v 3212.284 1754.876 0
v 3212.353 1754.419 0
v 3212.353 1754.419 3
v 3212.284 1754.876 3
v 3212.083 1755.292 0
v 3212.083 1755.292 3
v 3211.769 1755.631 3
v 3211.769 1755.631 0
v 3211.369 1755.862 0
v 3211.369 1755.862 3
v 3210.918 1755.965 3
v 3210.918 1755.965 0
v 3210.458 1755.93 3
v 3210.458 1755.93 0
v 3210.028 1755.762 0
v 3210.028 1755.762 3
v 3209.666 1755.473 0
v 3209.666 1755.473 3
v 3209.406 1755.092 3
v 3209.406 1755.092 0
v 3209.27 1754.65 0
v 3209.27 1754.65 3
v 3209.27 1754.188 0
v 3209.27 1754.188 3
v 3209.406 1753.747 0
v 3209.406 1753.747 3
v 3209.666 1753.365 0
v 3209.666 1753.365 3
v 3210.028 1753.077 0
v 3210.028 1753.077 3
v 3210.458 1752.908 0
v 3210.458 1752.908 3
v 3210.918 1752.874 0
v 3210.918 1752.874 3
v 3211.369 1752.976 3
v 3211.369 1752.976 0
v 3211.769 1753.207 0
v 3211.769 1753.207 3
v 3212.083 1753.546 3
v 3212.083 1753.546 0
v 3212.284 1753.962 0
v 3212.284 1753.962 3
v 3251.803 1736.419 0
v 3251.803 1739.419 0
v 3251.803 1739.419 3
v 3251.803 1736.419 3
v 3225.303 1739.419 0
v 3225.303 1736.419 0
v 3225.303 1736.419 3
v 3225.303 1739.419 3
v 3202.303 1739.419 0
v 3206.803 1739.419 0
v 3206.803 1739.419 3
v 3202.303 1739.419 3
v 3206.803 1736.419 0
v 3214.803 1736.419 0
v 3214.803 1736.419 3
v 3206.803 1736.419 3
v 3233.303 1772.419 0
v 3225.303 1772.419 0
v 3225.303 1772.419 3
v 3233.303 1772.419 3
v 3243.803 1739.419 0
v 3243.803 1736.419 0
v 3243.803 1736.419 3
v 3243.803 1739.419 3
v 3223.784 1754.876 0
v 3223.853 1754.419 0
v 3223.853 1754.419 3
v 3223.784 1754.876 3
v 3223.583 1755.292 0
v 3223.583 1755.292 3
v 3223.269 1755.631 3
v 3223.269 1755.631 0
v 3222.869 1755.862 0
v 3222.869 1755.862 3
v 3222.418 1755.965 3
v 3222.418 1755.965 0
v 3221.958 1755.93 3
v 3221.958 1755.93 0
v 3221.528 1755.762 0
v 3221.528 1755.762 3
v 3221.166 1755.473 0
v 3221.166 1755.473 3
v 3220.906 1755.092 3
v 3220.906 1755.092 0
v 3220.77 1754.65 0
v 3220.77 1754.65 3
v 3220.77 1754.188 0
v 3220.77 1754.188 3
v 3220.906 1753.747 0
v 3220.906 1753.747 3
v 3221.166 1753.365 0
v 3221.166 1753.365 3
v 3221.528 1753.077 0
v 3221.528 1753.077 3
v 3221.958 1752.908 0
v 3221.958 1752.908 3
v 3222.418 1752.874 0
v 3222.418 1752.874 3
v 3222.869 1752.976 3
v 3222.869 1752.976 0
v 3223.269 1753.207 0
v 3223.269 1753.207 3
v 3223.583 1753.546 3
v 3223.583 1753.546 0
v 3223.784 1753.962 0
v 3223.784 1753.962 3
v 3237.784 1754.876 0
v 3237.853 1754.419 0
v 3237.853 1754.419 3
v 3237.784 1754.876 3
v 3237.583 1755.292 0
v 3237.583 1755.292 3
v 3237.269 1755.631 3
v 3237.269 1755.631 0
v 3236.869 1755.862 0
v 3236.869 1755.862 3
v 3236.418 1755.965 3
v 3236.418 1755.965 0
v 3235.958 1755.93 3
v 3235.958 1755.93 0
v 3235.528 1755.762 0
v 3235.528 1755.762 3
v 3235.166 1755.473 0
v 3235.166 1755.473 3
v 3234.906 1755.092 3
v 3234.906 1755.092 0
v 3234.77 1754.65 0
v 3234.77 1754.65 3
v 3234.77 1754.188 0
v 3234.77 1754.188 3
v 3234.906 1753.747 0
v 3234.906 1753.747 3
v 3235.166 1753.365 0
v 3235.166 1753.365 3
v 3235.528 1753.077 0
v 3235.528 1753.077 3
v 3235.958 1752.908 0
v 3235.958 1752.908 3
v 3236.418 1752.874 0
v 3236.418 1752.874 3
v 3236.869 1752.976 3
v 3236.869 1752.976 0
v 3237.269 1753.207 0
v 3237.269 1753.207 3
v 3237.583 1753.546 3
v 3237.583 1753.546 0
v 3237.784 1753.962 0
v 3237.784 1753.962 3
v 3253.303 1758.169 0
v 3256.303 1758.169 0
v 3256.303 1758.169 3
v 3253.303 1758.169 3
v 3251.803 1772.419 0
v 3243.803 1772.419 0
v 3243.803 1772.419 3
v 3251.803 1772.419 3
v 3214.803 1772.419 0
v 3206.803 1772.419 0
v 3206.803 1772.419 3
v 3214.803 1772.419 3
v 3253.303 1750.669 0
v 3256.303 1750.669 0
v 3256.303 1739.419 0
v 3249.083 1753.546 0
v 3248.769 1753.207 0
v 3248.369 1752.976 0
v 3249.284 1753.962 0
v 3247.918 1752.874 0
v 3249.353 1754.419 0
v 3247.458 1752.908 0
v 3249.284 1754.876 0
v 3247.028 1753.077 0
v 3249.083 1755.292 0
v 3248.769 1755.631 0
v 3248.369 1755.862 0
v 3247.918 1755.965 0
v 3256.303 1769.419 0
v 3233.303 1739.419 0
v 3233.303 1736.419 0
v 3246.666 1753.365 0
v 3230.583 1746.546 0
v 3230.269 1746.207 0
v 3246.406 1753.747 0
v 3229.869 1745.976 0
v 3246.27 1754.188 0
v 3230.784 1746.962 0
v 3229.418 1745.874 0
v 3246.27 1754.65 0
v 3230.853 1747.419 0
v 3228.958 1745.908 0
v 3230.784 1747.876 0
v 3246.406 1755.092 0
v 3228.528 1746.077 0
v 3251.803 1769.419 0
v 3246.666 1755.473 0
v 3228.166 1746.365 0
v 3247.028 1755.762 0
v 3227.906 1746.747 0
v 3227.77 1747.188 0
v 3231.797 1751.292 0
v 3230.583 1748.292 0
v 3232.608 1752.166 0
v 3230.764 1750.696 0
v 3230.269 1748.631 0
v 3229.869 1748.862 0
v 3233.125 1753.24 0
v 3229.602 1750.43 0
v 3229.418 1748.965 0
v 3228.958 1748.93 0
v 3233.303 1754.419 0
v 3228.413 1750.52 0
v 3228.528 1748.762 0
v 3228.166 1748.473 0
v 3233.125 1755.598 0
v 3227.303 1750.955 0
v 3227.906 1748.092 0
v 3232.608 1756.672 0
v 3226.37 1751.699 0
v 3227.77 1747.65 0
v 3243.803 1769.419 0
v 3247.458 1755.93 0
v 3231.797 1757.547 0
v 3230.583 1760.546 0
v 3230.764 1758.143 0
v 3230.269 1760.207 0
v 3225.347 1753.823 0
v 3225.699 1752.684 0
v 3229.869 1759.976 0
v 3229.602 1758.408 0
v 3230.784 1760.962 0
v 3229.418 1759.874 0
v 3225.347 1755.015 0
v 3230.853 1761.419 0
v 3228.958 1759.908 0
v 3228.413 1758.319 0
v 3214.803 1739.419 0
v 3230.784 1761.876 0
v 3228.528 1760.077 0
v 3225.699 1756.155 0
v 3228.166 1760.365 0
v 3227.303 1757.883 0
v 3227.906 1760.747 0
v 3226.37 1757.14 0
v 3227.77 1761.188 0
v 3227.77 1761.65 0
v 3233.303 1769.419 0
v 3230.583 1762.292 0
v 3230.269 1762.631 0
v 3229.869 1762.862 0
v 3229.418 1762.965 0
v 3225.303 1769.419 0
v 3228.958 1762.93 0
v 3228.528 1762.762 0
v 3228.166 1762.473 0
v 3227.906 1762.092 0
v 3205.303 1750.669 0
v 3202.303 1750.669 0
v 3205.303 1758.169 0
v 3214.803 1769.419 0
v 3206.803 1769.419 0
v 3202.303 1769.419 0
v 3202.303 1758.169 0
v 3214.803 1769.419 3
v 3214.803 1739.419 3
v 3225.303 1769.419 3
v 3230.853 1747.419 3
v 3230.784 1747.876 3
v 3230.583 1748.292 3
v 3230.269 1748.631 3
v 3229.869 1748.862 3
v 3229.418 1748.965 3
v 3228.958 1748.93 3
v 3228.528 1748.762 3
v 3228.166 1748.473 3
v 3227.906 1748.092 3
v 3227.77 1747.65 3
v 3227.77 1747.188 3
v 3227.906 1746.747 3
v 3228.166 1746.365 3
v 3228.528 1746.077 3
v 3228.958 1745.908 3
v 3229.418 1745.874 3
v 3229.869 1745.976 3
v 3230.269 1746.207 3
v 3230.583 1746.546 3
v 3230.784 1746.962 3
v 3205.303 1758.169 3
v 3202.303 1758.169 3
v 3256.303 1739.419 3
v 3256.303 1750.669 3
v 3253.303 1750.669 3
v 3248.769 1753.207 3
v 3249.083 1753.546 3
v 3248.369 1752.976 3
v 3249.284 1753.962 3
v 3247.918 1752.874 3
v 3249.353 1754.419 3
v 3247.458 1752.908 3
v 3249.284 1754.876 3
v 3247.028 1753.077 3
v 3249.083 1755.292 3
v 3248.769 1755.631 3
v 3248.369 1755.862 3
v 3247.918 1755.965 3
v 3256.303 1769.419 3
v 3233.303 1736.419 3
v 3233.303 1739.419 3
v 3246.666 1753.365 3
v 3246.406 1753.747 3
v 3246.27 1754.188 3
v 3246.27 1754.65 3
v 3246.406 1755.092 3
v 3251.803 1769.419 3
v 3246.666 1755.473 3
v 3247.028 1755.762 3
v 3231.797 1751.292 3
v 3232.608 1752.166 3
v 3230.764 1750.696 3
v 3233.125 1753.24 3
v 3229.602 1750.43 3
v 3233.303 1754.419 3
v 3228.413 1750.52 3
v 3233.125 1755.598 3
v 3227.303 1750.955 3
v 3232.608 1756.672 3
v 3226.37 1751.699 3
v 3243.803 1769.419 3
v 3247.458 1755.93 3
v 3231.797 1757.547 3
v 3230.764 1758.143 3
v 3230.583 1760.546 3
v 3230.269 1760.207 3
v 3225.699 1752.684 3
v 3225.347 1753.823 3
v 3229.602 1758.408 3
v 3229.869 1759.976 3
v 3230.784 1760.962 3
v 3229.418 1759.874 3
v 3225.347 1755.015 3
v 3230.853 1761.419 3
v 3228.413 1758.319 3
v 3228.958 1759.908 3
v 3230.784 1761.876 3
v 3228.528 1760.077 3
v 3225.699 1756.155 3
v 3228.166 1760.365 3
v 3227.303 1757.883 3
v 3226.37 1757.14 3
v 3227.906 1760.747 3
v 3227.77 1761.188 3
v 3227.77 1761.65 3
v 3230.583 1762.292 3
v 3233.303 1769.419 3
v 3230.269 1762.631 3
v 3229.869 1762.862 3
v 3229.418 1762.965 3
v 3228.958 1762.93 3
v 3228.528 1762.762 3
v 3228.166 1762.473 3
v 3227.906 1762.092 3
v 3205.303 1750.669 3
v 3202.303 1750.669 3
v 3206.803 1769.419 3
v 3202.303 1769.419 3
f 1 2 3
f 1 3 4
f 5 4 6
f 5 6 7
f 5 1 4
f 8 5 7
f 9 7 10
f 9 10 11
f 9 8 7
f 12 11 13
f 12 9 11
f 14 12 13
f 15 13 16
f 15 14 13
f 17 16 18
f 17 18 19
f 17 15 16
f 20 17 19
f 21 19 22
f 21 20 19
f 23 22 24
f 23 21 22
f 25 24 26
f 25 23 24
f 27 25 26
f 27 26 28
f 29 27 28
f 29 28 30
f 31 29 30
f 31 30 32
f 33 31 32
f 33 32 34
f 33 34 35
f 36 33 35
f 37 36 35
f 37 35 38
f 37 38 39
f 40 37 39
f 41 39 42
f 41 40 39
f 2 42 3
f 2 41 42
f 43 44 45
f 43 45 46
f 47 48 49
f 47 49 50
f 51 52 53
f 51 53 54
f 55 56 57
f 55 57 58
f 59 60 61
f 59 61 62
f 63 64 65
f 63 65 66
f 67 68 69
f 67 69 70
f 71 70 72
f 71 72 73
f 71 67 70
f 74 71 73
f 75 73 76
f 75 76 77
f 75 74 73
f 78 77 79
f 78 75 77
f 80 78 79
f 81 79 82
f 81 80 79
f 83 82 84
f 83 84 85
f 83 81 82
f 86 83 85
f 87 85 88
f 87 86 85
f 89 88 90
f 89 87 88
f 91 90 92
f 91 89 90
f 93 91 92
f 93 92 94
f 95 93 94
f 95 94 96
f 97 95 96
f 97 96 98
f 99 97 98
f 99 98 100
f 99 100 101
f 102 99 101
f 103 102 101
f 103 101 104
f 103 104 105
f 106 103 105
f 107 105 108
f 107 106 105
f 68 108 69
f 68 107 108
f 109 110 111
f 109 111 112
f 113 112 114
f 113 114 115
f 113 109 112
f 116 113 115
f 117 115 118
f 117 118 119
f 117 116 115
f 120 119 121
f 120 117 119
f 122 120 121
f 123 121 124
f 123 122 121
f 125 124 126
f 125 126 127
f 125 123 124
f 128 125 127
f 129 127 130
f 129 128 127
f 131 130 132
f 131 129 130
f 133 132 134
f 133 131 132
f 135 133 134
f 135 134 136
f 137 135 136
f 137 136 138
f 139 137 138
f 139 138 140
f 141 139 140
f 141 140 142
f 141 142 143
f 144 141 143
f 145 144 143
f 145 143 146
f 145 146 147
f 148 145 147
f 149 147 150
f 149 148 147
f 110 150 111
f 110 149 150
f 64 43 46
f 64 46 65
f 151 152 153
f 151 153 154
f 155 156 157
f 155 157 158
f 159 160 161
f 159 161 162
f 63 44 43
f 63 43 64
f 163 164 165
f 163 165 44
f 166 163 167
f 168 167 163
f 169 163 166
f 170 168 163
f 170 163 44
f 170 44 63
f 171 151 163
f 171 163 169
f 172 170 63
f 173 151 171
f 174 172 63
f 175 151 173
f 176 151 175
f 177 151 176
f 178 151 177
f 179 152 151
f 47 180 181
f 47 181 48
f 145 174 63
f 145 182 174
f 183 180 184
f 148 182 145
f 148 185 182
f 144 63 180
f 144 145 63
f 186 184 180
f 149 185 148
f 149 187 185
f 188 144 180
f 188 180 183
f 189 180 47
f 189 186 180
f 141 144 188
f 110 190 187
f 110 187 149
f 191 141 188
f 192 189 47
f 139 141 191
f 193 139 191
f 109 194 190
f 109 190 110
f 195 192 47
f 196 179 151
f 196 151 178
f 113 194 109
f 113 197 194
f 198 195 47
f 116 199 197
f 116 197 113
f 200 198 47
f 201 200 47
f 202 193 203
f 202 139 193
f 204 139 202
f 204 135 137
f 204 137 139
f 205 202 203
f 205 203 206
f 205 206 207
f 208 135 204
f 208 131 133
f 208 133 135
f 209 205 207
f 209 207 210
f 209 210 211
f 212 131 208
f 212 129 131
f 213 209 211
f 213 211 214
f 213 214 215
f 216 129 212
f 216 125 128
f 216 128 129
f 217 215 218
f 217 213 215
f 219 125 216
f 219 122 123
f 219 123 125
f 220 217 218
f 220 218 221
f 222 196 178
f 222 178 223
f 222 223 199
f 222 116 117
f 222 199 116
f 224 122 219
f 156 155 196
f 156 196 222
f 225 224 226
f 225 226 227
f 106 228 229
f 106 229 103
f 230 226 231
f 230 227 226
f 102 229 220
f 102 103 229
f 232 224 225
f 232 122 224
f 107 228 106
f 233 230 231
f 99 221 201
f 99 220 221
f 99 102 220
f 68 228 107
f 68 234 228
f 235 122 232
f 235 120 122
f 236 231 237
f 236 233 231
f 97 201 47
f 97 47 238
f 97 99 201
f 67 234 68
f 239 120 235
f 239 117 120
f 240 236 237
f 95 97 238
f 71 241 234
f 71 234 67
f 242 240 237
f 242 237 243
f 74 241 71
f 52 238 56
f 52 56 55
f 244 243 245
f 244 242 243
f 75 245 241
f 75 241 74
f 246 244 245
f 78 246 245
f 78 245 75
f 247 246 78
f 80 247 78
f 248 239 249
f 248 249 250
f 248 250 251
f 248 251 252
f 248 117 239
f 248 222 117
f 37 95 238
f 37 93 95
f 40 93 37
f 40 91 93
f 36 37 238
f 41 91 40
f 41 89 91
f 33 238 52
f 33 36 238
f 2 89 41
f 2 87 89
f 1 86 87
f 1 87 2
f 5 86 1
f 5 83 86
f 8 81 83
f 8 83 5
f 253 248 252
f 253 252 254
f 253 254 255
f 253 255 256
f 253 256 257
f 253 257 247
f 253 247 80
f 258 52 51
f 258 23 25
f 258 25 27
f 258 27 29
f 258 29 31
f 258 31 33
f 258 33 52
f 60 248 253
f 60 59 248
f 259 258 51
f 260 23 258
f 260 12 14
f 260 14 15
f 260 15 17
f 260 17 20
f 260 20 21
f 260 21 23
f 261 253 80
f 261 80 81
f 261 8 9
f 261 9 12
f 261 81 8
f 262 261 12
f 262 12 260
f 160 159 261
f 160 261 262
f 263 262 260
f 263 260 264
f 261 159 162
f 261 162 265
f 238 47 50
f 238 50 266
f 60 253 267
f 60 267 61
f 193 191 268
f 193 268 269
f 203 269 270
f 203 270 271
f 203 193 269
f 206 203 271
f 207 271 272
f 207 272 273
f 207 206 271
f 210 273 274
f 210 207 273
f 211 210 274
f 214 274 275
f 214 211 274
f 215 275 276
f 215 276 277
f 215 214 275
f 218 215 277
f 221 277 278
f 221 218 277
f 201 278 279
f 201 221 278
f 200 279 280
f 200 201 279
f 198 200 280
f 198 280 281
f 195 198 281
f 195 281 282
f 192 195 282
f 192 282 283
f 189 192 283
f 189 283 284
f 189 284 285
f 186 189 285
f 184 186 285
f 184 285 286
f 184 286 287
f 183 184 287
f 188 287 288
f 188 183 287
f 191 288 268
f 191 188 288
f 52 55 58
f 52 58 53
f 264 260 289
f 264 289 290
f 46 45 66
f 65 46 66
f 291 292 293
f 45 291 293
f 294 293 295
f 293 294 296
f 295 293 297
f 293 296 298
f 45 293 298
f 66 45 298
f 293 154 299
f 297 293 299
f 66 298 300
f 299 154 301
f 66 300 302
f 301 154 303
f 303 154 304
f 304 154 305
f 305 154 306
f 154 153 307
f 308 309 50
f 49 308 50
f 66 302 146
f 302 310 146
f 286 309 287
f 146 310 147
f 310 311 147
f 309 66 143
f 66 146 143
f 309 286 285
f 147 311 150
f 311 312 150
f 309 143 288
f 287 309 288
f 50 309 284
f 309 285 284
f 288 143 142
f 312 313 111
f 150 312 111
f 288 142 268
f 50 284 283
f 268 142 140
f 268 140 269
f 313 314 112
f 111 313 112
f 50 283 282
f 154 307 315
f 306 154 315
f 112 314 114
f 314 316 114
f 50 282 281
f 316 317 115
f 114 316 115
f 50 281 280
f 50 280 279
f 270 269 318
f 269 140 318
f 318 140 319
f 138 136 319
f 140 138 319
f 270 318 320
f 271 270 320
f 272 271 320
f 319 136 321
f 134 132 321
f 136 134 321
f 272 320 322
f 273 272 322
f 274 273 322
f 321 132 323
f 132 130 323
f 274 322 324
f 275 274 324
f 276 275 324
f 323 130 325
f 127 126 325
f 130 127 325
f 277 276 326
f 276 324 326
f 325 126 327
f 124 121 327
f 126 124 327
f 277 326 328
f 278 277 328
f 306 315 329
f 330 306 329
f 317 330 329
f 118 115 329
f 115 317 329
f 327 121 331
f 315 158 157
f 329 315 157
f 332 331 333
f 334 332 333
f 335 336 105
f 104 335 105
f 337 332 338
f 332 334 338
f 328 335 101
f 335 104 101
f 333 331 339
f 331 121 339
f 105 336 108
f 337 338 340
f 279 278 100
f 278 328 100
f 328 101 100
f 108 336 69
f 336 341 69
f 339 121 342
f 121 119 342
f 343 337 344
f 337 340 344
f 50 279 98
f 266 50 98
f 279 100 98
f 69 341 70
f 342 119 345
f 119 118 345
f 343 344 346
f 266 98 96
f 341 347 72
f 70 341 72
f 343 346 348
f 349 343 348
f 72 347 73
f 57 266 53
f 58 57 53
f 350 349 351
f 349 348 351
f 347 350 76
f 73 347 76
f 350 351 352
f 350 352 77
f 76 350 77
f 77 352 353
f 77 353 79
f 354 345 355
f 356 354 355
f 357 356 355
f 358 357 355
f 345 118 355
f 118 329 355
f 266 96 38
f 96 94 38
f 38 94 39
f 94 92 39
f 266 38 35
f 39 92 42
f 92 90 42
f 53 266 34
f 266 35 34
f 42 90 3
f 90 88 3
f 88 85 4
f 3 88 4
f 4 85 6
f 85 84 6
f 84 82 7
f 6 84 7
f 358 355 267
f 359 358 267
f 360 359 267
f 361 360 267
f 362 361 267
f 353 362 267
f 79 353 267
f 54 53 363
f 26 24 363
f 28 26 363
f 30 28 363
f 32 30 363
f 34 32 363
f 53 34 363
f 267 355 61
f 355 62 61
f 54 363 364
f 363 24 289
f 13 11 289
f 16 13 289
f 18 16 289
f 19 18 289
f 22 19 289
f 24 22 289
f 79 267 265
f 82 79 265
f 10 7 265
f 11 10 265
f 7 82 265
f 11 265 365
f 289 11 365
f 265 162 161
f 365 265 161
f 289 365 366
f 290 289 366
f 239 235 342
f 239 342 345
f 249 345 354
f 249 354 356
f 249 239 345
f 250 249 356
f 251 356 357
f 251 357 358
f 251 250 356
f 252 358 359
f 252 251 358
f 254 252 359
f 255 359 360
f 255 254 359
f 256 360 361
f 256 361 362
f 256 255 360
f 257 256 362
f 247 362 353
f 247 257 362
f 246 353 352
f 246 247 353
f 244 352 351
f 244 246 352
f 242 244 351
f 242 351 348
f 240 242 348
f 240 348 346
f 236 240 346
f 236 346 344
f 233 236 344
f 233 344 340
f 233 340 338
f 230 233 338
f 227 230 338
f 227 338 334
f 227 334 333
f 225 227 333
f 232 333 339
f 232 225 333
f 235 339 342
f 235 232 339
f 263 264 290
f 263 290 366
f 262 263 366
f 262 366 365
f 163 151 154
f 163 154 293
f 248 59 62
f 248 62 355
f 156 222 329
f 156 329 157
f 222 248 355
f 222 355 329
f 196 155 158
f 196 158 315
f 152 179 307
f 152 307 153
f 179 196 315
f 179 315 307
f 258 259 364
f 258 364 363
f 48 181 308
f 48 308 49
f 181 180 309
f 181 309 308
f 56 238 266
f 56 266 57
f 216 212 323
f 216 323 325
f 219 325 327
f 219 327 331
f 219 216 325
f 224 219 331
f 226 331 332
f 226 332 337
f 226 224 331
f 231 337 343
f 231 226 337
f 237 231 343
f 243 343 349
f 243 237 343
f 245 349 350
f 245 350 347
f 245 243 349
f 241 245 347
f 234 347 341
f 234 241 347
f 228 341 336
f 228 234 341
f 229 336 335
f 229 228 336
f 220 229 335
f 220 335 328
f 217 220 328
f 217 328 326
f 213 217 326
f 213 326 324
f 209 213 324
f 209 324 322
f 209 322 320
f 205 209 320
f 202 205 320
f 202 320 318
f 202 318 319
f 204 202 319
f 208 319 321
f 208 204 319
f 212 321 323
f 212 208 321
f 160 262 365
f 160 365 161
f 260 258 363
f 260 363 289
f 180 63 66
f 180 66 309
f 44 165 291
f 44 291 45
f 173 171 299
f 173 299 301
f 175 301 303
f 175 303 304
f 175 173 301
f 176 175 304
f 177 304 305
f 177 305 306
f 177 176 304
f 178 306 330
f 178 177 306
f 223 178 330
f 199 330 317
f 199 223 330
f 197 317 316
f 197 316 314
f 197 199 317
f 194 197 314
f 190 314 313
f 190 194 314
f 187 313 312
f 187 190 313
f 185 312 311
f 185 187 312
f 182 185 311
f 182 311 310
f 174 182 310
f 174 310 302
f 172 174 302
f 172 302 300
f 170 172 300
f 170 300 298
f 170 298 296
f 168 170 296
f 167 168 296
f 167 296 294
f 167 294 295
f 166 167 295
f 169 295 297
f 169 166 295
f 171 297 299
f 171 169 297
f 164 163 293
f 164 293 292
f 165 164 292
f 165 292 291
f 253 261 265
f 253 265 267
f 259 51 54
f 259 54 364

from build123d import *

# Parameters (mm, degrees)
SKETCH_1_R      = 1.55
SKETCH_1_R_2    = 4
EXTRUDE_1_DEPTH = 3


with BuildPart() as part:
    # 草图1 → 凸台-拉伸1 (new body)
    with BuildSketch(Plane.XY):
        Polygon((3214.80265522, 1769.419217818), (3225.30265522, 1769.419217818), (3225.30265522, 1772.419217818), (3233.30265522, 1772.419217818), (3233.30265522, 1769.419217818), (3243.80265522, 1769.419217818), (3243.80265522, 1772.419217818), (3251.80265522, 1772.419217818), (3251.80265522, 1769.419217818), (3256.30265522, 1769.419217818), (3256.30265522, 1758.169217818), (3253.30265522, 1758.169217818), (3253.30265522, 1750.669217818), (3256.30265522, 1750.669217818), (3256.30265522, 1739.419217818), (3251.80265522, 1739.419217818), (3251.80265522, 1736.419217818), (3243.80265522, 1736.419217818), (3243.80265522, 1739.419217818), (3233.30265522, 1739.419217818), (3233.30265522, 1736.419217818), (3225.30265522, 1736.419217818), (3225.30265522, 1739.419217818), (3214.80265522, 1739.419217818), (3214.80265522, 1736.419217818), (3206.80265522, 1736.419217818), (3206.80265522, 1739.419217818), (3202.30265522, 1739.419217818), (3202.30265522, 1750.669217818), (3205.30265522, 1750.669217818), (3205.30265522, 1758.169217818), (3202.30265522, 1758.169217818), (3202.30265522, 1769.419217818), (3206.80265522, 1769.419217818), (3206.80265522, 1772.419217818), (3214.80265522, 1772.419217818), align=None)
        with Locations((3236.30265522, 1754.419217818)):
            Circle(SKETCH_1_R, mode=Mode.SUBTRACT)
        with Locations((3229.30265522, 1761.419217818)):
            Circle(SKETCH_1_R, mode=Mode.SUBTRACT)
        with Locations((3222.30265522, 1754.419217818)):
            Circle(SKETCH_1_R, mode=Mode.SUBTRACT)
        with Locations((3229.30265522, 1747.419217818)):
            Circle(SKETCH_1_R, mode=Mode.SUBTRACT)
        with Locations((3229.30265522, 1754.419217818)):
            Circle(SKETCH_1_R_2, mode=Mode.SUBTRACT)
        with Locations((3247.80265522, 1754.419217818)):
            Circle(SKETCH_1_R, mode=Mode.SUBTRACT)
        with Locations((3210.80265522, 1754.419217818)):
            Circle(SKETCH_1_R, mode=Mode.SUBTRACT)
    extrude(amount=EXTRUDE_1_DEPTH)


solid = part.part
